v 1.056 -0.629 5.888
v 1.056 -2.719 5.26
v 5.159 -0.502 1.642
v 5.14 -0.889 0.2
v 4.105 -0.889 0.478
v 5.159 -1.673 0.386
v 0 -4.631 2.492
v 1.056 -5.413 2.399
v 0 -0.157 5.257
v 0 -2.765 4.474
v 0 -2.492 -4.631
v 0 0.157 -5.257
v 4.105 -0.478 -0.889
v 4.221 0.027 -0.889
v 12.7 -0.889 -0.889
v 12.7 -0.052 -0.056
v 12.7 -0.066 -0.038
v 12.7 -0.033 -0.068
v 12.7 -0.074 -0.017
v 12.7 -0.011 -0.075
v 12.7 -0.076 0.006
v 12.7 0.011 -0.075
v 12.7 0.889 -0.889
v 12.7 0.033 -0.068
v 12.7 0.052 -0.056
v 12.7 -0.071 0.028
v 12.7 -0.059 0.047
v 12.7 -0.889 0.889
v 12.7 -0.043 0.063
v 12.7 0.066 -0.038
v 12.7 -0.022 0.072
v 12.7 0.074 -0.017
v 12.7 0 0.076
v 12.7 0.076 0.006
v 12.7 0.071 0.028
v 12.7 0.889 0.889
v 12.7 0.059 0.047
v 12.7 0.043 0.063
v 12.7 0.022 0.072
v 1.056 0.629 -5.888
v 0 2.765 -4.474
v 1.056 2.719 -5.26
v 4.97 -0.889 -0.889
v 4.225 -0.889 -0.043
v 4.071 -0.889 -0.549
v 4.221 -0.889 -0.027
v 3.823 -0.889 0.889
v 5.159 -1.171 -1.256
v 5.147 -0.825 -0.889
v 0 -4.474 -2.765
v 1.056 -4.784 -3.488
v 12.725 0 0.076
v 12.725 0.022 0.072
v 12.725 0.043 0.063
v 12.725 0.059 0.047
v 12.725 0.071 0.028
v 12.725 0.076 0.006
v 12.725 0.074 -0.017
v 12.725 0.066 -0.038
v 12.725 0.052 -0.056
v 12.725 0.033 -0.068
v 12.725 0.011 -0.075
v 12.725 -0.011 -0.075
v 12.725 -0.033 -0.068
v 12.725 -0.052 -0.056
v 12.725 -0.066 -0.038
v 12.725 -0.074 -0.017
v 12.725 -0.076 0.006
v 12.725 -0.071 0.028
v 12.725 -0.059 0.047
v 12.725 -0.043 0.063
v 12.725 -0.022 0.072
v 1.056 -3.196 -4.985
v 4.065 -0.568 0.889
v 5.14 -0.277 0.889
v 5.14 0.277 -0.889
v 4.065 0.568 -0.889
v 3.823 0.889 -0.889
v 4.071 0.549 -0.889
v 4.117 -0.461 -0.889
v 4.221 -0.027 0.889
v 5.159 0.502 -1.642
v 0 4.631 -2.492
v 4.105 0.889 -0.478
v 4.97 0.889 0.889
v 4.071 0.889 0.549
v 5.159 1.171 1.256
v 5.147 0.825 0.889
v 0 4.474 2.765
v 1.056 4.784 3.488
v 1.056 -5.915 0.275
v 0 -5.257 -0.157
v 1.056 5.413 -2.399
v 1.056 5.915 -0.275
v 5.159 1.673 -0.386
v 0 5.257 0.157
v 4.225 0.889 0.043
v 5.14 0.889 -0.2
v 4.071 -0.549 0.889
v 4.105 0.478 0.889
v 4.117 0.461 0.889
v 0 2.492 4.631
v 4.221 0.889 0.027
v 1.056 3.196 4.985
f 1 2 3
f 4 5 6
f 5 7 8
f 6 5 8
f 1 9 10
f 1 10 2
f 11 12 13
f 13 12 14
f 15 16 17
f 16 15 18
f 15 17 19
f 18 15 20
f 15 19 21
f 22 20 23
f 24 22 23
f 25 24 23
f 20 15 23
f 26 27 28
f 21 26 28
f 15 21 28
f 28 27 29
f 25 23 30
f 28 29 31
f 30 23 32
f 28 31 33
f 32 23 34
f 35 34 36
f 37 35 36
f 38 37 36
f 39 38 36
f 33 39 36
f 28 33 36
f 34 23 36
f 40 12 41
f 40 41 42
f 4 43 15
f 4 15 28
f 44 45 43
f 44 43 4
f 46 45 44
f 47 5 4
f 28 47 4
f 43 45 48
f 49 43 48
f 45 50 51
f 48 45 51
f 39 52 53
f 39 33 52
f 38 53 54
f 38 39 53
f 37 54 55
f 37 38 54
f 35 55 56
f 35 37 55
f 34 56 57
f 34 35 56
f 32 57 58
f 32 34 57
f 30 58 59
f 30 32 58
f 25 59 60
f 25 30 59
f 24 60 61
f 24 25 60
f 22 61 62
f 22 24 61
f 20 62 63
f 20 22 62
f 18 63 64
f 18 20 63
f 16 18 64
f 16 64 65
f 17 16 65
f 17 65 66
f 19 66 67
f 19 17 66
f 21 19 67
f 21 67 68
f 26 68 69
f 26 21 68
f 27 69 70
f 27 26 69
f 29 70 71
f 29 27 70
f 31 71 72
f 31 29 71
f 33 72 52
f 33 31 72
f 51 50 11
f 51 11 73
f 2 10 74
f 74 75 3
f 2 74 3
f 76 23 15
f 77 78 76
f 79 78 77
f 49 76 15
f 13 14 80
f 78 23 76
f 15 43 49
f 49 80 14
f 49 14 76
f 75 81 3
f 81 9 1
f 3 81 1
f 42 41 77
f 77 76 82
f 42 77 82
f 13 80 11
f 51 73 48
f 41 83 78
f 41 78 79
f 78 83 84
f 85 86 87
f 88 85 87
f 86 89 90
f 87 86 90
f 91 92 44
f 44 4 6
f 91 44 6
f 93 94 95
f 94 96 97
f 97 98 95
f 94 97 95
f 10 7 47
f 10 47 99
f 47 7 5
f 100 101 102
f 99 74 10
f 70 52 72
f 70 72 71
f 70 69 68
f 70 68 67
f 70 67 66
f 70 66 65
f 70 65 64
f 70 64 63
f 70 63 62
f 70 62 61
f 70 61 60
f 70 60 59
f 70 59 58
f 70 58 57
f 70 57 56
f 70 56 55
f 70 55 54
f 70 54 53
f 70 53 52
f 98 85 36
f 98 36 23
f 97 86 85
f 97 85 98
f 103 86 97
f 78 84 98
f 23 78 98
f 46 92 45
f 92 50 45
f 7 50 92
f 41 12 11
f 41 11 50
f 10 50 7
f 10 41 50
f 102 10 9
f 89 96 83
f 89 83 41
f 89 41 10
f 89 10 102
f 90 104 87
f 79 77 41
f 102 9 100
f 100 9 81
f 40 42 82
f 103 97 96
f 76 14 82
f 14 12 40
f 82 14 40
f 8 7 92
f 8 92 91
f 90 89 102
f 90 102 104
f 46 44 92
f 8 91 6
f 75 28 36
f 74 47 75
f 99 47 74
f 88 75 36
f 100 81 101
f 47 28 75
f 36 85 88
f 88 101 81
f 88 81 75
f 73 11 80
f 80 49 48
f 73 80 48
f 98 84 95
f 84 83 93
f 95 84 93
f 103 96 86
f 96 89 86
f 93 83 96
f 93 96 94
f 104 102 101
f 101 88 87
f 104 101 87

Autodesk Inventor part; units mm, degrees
ref_plane "YZ Plane" through (0, 0, 0) normal (1, 0, 0) x (0, 1, 0)
ref_plane "XZ Plane" through (0, 0, 0) normal (0, 1, 0) x (-1, 0, 0)
ref_plane "XY Plane" through (0, 0, 0) normal (0, 0, 1) x (1, 0, 0)
sketch "Sketch6" plane through (0, 0, 0) normal (1, 0, 0) x (0, 1, 0)
  line L0 (5.2569, 0.1572) -> (4.6312, -2.4922)
  line L1 (4.6312, -2.4922) -> (2.7646, -4.4739)
  line L2 (2.7646, -4.4739) -> (0.1572, -5.2569)
  line L3 (0.1572, -5.2569) -> (-2.4922, -4.6312)
  line L4 (-2.4922, -4.6312) -> (-4.4739, -2.7646)
  line L5 (-4.4739, -2.7646) -> (-5.2569, -0.1572)
  line L6 (-5.2569, -0.1572) -> (-4.6312, 2.4922)
  line L7 (-4.6312, 2.4922) -> (-2.7646, 4.4739)
  line L8 (-2.7646, 4.4739) -> (-0.1572, 5.2569)
  line L9 (-0.1572, 5.2569) -> (2.4922, 4.6312)
  line L10 (2.4922, 4.6312) -> (4.4739, 2.7646)
  line L11 (4.4739, 2.7646) -> (5.2569, 0.1572)
  point P0 (0, 0)
  point P1 (0, 0)
  dimension "d27" = 5.08
extrude "Extrusion2" add sketch "Sketch6" along normal blind 6.096 draft -45
sketch "Sketch7" plane through (0, 2.4922, 4.6312) normal (0.7071068, 0.484827, 0.5147259) x (0, 0.7279324, -0.6856489)
  line L0 (0, 0) -> (2.7224, 0)
  line L1 (0, 0) -> (2.7224, 0) projected
  line L2 (2.7224, 0) -> (1.3511, -7.2372)
  line L3 (2.7224, 0) -> (1.3612, -7.1842) projected
  line L4 (1.3511, -7.2372) -> (0, 0)
  point P0 (1.3612, -3.5921)
  dimension "d38" = 0
  dimension "d30" = 7.366
extrude "Extrusion3" add sketch "Sketch7" along normal blind 1.27 draft -10
sketch "Sketch8" plane through (0, 0, 0) normal (-1, 0, 0) x (0, 0, 1)
  line L0 (-0.889, -0.889) -> (0.889, -0.889)
  line L1 (0.889, -0.889) -> (0.889, 0.889)
  line L2 (0.889, 0.889) -> (-0.889, 0.889)
  line L3 (-0.889, 0.889) -> (-0.889, -0.889)
  line L4 (-0.889, -0.889) -> (0.889, 0.889) construction
  line L5 (0.889, -0.889) -> (-0.889, 0.889) construction
  point P0 (0, 0)
  dimension "d33" = 1.778
  dimension "d34" = 1.778
extrude "Extrusion4" add sketch "Sketch8" against normal blind 12.7
sketch "Sketch9" plane through (12.7, 0, 0) normal (1, 0, 0) x (0, 0, 1)
  circle A0 centre (0, 0) radius 0.0758
  point P0 (0, 0)
extrude "Extrusion5" add sketch "Sketch9" along normal blind 0.0254
pattern_circular "Circular Pattern1" count 6 over 360 about axis through (12.7, 0, 0) along (1, 0, 0) of "Extrusion3"
properties part number "RotateGear"
